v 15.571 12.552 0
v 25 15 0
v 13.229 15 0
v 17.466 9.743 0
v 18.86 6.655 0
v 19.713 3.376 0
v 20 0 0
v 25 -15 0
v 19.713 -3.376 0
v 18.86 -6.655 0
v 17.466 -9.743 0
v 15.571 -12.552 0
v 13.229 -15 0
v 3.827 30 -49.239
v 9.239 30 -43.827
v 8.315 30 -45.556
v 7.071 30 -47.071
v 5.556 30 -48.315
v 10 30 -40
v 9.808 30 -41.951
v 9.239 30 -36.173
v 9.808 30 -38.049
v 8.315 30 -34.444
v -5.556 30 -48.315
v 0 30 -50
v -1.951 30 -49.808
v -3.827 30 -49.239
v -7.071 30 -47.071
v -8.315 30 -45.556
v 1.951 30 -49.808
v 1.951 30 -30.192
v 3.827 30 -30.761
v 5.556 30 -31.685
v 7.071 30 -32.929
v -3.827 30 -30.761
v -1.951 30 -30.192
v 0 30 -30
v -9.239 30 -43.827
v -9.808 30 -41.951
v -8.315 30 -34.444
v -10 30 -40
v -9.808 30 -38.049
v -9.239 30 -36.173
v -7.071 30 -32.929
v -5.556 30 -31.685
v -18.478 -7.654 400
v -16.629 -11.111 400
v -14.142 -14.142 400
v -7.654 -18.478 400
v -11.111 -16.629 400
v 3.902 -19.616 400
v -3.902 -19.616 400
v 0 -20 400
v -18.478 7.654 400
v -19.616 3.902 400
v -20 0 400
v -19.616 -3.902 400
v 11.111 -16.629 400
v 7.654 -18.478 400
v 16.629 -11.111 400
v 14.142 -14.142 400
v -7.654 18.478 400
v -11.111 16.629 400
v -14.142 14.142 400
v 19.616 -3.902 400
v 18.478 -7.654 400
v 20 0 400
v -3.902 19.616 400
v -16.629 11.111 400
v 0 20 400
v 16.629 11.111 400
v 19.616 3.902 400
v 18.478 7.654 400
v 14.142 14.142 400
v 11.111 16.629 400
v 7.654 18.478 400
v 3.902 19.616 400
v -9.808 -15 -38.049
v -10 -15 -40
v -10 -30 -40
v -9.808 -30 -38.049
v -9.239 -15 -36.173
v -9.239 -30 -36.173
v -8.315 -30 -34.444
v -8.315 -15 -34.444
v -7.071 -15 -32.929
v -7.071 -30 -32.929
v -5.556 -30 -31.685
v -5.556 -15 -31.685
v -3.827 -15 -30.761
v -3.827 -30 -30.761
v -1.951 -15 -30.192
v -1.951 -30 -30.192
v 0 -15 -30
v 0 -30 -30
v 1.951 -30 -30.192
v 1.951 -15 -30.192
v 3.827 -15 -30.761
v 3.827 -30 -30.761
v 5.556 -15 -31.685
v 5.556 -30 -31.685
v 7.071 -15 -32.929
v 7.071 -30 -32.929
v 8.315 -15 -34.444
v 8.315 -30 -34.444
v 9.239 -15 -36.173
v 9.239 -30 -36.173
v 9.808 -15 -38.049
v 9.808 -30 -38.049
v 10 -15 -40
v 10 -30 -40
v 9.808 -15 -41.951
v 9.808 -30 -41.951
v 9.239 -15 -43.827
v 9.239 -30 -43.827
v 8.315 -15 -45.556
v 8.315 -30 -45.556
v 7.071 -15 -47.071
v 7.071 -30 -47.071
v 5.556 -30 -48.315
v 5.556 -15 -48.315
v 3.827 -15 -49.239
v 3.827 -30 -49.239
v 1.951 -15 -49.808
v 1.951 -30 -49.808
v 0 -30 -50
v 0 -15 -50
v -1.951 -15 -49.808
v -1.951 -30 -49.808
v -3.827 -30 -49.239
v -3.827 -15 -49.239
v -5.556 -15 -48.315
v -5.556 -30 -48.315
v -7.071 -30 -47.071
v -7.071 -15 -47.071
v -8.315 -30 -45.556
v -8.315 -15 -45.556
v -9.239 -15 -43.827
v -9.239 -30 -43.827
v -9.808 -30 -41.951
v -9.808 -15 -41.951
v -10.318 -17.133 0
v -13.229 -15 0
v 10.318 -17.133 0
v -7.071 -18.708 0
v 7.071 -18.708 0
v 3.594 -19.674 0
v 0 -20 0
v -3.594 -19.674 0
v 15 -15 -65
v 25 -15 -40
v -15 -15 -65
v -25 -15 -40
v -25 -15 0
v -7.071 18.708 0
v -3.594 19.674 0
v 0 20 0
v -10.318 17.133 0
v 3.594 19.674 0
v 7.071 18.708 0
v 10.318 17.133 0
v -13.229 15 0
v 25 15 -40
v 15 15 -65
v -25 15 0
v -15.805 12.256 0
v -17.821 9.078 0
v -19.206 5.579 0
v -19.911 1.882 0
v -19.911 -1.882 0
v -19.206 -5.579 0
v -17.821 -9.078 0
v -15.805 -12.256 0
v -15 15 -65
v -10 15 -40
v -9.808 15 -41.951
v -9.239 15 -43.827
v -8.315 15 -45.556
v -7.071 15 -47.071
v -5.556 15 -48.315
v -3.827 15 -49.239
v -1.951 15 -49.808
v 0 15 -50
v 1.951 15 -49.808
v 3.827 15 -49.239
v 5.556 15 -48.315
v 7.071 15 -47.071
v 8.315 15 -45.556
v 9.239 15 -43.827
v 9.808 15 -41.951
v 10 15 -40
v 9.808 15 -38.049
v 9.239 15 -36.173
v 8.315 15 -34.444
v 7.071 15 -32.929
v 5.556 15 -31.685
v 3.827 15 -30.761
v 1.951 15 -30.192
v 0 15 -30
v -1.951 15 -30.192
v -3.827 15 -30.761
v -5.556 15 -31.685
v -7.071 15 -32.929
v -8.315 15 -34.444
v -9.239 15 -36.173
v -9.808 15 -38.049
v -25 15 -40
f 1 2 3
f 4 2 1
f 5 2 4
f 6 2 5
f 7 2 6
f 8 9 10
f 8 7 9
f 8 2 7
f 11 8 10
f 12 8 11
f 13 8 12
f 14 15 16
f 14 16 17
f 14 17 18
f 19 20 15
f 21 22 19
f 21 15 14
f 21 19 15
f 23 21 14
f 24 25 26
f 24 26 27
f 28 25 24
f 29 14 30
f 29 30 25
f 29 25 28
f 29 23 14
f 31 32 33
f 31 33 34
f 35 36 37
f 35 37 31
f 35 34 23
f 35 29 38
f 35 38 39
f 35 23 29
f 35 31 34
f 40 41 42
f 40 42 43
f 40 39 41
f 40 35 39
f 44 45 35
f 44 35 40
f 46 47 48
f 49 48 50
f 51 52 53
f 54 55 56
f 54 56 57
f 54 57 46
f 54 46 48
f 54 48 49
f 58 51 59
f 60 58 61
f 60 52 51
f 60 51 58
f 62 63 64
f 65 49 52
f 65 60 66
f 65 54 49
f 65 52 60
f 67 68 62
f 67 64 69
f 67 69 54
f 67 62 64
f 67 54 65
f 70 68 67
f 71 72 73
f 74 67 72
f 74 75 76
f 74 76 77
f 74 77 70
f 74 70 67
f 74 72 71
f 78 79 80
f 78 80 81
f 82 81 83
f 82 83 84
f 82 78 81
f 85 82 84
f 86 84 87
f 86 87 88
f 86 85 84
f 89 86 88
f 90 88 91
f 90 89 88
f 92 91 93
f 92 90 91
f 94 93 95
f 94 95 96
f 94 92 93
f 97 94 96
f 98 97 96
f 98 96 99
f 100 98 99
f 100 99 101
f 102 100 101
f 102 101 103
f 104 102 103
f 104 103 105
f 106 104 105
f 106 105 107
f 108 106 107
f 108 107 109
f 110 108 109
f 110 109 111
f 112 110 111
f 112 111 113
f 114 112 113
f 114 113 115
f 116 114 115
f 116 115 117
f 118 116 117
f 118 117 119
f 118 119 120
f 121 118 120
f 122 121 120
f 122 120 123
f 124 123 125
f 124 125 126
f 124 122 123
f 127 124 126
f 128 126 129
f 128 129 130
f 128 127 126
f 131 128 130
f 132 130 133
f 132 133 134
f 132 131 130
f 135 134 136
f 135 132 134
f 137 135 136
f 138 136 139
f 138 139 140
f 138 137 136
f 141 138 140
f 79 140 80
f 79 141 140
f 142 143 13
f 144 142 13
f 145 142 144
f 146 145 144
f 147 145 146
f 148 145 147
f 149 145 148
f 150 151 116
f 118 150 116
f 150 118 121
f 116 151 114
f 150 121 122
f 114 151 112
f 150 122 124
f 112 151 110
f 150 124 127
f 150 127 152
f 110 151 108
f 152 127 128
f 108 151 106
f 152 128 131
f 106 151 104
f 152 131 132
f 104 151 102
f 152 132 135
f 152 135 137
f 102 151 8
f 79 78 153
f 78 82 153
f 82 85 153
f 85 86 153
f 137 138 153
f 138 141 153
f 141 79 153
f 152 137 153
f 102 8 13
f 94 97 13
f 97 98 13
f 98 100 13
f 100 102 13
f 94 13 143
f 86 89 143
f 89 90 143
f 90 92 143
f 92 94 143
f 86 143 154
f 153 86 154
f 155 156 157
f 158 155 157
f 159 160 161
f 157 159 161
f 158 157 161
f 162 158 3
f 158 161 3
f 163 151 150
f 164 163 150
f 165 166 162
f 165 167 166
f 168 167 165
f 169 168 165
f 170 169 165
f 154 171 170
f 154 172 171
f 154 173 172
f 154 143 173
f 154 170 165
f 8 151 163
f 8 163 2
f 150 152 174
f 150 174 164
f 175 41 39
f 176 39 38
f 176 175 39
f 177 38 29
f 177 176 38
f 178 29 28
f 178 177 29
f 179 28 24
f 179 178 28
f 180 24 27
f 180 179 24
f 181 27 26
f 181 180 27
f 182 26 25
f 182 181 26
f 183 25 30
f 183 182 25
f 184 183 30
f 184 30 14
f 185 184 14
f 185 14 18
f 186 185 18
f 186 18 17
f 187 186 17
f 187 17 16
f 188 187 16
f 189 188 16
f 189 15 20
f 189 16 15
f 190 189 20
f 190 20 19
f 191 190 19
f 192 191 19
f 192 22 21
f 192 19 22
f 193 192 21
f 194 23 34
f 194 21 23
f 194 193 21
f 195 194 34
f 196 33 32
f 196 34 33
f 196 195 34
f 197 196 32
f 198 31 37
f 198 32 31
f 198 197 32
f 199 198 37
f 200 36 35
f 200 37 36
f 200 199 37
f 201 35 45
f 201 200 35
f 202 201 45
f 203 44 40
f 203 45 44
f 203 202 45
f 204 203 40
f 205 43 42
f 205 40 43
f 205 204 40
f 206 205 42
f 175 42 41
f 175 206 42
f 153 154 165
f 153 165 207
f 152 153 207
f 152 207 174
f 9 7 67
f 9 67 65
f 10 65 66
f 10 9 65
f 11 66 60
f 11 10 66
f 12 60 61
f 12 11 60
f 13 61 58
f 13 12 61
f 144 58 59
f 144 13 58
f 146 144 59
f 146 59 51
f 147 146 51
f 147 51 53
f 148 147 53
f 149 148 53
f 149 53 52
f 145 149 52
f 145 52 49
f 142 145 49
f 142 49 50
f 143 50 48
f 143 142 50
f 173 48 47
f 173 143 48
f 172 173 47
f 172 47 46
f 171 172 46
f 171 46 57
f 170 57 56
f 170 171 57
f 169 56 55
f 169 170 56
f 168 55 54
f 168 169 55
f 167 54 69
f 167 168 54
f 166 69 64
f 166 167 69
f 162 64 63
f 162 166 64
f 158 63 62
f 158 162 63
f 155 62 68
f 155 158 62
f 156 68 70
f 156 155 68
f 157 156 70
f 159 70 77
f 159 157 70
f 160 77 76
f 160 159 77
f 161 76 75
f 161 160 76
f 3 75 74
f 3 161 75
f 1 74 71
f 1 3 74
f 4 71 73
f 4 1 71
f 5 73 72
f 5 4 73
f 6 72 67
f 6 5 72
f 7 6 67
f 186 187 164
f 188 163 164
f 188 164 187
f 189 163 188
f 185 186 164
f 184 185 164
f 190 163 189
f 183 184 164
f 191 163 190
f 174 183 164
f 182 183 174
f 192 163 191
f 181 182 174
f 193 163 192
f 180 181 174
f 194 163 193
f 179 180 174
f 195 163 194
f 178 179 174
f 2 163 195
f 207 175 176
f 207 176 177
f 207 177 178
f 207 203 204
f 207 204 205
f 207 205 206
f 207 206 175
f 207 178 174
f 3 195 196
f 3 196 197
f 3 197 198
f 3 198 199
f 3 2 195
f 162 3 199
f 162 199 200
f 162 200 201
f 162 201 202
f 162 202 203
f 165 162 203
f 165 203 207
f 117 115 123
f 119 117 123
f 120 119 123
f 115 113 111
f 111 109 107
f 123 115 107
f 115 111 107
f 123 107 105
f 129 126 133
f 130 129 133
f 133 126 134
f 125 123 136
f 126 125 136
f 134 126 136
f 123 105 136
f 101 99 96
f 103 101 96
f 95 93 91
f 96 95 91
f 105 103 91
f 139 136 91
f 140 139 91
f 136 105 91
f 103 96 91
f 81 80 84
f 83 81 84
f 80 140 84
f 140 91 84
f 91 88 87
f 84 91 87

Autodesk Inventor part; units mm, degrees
ref_plane "YZ Plane" through (0, 0, 0) normal (1, 0, 0) x (0, 1, 0)
ref_plane "XZ Plane" through (0, 0, 0) normal (0, 1, 0) x (-1, 0, 0)
ref_plane "XY Plane" through (0, 0, 0) normal (0, 0, 1) x (1, 0, 0)
sketch "Sketch1" plane through (0, 0, 0) normal (0, 0, 1) x (1, 0, 0)
  circle A0 centre (0, 0) radius 20
  dimension "d0" = 40
extrude "Extrusion1" add sketch "Sketch1" along normal blind 400
sketch "Sketch2" plane through (0, 0, 0) normal (0, 1, 0) x (-1, 0, 0)
  line L0 (15, -65) -> (-15, -65)
  line L1 (-25, -40) -> (-25, 0)
  line L2 (-25, 0) -> (25, 0)
  line L3 (25, 0) -> (25, -40)
  line L4 (25, -65) -> (-25, 0) construction
  line L5 (-25, -65) -> (25, 0) construction
  line L6 (25, -40) -> (15, -65)
  line L7 (-25, -40) -> (-15, -65)
  point P0 (0, 0)
  point P1 (0, -32.5)
  dimension "d3" = 50
  dimension "d4" = 65
  dimension "d5" = 25
  dimension "d6" = 10
  dimension "d7" = 25
  dimension "d8" = 10
extrude "Extrusion2" add sketch "Sketch2" along normal mid plane 30
sketch "Sketch3" plane through (0, 15, 0) normal (0, 1, 0) x (1, 0, 0)
  point P0 (0, 0)
sketch "Sketch4" plane through (0, 0, 0) normal (0, 1, 0) x (-1, 0, 0)
  circle A0 centre (0, -40) radius 10
  line L0 (13.2288, 0) -> (-13.2288, 0) projected
  point P0 (0, 0)
  dimension "d11" = 20
  dimension "d12" = 40
extrude "Extrusion3" add sketch "Sketch4" along normal mid plane 60
properties part number "Parth_Pushrod"
